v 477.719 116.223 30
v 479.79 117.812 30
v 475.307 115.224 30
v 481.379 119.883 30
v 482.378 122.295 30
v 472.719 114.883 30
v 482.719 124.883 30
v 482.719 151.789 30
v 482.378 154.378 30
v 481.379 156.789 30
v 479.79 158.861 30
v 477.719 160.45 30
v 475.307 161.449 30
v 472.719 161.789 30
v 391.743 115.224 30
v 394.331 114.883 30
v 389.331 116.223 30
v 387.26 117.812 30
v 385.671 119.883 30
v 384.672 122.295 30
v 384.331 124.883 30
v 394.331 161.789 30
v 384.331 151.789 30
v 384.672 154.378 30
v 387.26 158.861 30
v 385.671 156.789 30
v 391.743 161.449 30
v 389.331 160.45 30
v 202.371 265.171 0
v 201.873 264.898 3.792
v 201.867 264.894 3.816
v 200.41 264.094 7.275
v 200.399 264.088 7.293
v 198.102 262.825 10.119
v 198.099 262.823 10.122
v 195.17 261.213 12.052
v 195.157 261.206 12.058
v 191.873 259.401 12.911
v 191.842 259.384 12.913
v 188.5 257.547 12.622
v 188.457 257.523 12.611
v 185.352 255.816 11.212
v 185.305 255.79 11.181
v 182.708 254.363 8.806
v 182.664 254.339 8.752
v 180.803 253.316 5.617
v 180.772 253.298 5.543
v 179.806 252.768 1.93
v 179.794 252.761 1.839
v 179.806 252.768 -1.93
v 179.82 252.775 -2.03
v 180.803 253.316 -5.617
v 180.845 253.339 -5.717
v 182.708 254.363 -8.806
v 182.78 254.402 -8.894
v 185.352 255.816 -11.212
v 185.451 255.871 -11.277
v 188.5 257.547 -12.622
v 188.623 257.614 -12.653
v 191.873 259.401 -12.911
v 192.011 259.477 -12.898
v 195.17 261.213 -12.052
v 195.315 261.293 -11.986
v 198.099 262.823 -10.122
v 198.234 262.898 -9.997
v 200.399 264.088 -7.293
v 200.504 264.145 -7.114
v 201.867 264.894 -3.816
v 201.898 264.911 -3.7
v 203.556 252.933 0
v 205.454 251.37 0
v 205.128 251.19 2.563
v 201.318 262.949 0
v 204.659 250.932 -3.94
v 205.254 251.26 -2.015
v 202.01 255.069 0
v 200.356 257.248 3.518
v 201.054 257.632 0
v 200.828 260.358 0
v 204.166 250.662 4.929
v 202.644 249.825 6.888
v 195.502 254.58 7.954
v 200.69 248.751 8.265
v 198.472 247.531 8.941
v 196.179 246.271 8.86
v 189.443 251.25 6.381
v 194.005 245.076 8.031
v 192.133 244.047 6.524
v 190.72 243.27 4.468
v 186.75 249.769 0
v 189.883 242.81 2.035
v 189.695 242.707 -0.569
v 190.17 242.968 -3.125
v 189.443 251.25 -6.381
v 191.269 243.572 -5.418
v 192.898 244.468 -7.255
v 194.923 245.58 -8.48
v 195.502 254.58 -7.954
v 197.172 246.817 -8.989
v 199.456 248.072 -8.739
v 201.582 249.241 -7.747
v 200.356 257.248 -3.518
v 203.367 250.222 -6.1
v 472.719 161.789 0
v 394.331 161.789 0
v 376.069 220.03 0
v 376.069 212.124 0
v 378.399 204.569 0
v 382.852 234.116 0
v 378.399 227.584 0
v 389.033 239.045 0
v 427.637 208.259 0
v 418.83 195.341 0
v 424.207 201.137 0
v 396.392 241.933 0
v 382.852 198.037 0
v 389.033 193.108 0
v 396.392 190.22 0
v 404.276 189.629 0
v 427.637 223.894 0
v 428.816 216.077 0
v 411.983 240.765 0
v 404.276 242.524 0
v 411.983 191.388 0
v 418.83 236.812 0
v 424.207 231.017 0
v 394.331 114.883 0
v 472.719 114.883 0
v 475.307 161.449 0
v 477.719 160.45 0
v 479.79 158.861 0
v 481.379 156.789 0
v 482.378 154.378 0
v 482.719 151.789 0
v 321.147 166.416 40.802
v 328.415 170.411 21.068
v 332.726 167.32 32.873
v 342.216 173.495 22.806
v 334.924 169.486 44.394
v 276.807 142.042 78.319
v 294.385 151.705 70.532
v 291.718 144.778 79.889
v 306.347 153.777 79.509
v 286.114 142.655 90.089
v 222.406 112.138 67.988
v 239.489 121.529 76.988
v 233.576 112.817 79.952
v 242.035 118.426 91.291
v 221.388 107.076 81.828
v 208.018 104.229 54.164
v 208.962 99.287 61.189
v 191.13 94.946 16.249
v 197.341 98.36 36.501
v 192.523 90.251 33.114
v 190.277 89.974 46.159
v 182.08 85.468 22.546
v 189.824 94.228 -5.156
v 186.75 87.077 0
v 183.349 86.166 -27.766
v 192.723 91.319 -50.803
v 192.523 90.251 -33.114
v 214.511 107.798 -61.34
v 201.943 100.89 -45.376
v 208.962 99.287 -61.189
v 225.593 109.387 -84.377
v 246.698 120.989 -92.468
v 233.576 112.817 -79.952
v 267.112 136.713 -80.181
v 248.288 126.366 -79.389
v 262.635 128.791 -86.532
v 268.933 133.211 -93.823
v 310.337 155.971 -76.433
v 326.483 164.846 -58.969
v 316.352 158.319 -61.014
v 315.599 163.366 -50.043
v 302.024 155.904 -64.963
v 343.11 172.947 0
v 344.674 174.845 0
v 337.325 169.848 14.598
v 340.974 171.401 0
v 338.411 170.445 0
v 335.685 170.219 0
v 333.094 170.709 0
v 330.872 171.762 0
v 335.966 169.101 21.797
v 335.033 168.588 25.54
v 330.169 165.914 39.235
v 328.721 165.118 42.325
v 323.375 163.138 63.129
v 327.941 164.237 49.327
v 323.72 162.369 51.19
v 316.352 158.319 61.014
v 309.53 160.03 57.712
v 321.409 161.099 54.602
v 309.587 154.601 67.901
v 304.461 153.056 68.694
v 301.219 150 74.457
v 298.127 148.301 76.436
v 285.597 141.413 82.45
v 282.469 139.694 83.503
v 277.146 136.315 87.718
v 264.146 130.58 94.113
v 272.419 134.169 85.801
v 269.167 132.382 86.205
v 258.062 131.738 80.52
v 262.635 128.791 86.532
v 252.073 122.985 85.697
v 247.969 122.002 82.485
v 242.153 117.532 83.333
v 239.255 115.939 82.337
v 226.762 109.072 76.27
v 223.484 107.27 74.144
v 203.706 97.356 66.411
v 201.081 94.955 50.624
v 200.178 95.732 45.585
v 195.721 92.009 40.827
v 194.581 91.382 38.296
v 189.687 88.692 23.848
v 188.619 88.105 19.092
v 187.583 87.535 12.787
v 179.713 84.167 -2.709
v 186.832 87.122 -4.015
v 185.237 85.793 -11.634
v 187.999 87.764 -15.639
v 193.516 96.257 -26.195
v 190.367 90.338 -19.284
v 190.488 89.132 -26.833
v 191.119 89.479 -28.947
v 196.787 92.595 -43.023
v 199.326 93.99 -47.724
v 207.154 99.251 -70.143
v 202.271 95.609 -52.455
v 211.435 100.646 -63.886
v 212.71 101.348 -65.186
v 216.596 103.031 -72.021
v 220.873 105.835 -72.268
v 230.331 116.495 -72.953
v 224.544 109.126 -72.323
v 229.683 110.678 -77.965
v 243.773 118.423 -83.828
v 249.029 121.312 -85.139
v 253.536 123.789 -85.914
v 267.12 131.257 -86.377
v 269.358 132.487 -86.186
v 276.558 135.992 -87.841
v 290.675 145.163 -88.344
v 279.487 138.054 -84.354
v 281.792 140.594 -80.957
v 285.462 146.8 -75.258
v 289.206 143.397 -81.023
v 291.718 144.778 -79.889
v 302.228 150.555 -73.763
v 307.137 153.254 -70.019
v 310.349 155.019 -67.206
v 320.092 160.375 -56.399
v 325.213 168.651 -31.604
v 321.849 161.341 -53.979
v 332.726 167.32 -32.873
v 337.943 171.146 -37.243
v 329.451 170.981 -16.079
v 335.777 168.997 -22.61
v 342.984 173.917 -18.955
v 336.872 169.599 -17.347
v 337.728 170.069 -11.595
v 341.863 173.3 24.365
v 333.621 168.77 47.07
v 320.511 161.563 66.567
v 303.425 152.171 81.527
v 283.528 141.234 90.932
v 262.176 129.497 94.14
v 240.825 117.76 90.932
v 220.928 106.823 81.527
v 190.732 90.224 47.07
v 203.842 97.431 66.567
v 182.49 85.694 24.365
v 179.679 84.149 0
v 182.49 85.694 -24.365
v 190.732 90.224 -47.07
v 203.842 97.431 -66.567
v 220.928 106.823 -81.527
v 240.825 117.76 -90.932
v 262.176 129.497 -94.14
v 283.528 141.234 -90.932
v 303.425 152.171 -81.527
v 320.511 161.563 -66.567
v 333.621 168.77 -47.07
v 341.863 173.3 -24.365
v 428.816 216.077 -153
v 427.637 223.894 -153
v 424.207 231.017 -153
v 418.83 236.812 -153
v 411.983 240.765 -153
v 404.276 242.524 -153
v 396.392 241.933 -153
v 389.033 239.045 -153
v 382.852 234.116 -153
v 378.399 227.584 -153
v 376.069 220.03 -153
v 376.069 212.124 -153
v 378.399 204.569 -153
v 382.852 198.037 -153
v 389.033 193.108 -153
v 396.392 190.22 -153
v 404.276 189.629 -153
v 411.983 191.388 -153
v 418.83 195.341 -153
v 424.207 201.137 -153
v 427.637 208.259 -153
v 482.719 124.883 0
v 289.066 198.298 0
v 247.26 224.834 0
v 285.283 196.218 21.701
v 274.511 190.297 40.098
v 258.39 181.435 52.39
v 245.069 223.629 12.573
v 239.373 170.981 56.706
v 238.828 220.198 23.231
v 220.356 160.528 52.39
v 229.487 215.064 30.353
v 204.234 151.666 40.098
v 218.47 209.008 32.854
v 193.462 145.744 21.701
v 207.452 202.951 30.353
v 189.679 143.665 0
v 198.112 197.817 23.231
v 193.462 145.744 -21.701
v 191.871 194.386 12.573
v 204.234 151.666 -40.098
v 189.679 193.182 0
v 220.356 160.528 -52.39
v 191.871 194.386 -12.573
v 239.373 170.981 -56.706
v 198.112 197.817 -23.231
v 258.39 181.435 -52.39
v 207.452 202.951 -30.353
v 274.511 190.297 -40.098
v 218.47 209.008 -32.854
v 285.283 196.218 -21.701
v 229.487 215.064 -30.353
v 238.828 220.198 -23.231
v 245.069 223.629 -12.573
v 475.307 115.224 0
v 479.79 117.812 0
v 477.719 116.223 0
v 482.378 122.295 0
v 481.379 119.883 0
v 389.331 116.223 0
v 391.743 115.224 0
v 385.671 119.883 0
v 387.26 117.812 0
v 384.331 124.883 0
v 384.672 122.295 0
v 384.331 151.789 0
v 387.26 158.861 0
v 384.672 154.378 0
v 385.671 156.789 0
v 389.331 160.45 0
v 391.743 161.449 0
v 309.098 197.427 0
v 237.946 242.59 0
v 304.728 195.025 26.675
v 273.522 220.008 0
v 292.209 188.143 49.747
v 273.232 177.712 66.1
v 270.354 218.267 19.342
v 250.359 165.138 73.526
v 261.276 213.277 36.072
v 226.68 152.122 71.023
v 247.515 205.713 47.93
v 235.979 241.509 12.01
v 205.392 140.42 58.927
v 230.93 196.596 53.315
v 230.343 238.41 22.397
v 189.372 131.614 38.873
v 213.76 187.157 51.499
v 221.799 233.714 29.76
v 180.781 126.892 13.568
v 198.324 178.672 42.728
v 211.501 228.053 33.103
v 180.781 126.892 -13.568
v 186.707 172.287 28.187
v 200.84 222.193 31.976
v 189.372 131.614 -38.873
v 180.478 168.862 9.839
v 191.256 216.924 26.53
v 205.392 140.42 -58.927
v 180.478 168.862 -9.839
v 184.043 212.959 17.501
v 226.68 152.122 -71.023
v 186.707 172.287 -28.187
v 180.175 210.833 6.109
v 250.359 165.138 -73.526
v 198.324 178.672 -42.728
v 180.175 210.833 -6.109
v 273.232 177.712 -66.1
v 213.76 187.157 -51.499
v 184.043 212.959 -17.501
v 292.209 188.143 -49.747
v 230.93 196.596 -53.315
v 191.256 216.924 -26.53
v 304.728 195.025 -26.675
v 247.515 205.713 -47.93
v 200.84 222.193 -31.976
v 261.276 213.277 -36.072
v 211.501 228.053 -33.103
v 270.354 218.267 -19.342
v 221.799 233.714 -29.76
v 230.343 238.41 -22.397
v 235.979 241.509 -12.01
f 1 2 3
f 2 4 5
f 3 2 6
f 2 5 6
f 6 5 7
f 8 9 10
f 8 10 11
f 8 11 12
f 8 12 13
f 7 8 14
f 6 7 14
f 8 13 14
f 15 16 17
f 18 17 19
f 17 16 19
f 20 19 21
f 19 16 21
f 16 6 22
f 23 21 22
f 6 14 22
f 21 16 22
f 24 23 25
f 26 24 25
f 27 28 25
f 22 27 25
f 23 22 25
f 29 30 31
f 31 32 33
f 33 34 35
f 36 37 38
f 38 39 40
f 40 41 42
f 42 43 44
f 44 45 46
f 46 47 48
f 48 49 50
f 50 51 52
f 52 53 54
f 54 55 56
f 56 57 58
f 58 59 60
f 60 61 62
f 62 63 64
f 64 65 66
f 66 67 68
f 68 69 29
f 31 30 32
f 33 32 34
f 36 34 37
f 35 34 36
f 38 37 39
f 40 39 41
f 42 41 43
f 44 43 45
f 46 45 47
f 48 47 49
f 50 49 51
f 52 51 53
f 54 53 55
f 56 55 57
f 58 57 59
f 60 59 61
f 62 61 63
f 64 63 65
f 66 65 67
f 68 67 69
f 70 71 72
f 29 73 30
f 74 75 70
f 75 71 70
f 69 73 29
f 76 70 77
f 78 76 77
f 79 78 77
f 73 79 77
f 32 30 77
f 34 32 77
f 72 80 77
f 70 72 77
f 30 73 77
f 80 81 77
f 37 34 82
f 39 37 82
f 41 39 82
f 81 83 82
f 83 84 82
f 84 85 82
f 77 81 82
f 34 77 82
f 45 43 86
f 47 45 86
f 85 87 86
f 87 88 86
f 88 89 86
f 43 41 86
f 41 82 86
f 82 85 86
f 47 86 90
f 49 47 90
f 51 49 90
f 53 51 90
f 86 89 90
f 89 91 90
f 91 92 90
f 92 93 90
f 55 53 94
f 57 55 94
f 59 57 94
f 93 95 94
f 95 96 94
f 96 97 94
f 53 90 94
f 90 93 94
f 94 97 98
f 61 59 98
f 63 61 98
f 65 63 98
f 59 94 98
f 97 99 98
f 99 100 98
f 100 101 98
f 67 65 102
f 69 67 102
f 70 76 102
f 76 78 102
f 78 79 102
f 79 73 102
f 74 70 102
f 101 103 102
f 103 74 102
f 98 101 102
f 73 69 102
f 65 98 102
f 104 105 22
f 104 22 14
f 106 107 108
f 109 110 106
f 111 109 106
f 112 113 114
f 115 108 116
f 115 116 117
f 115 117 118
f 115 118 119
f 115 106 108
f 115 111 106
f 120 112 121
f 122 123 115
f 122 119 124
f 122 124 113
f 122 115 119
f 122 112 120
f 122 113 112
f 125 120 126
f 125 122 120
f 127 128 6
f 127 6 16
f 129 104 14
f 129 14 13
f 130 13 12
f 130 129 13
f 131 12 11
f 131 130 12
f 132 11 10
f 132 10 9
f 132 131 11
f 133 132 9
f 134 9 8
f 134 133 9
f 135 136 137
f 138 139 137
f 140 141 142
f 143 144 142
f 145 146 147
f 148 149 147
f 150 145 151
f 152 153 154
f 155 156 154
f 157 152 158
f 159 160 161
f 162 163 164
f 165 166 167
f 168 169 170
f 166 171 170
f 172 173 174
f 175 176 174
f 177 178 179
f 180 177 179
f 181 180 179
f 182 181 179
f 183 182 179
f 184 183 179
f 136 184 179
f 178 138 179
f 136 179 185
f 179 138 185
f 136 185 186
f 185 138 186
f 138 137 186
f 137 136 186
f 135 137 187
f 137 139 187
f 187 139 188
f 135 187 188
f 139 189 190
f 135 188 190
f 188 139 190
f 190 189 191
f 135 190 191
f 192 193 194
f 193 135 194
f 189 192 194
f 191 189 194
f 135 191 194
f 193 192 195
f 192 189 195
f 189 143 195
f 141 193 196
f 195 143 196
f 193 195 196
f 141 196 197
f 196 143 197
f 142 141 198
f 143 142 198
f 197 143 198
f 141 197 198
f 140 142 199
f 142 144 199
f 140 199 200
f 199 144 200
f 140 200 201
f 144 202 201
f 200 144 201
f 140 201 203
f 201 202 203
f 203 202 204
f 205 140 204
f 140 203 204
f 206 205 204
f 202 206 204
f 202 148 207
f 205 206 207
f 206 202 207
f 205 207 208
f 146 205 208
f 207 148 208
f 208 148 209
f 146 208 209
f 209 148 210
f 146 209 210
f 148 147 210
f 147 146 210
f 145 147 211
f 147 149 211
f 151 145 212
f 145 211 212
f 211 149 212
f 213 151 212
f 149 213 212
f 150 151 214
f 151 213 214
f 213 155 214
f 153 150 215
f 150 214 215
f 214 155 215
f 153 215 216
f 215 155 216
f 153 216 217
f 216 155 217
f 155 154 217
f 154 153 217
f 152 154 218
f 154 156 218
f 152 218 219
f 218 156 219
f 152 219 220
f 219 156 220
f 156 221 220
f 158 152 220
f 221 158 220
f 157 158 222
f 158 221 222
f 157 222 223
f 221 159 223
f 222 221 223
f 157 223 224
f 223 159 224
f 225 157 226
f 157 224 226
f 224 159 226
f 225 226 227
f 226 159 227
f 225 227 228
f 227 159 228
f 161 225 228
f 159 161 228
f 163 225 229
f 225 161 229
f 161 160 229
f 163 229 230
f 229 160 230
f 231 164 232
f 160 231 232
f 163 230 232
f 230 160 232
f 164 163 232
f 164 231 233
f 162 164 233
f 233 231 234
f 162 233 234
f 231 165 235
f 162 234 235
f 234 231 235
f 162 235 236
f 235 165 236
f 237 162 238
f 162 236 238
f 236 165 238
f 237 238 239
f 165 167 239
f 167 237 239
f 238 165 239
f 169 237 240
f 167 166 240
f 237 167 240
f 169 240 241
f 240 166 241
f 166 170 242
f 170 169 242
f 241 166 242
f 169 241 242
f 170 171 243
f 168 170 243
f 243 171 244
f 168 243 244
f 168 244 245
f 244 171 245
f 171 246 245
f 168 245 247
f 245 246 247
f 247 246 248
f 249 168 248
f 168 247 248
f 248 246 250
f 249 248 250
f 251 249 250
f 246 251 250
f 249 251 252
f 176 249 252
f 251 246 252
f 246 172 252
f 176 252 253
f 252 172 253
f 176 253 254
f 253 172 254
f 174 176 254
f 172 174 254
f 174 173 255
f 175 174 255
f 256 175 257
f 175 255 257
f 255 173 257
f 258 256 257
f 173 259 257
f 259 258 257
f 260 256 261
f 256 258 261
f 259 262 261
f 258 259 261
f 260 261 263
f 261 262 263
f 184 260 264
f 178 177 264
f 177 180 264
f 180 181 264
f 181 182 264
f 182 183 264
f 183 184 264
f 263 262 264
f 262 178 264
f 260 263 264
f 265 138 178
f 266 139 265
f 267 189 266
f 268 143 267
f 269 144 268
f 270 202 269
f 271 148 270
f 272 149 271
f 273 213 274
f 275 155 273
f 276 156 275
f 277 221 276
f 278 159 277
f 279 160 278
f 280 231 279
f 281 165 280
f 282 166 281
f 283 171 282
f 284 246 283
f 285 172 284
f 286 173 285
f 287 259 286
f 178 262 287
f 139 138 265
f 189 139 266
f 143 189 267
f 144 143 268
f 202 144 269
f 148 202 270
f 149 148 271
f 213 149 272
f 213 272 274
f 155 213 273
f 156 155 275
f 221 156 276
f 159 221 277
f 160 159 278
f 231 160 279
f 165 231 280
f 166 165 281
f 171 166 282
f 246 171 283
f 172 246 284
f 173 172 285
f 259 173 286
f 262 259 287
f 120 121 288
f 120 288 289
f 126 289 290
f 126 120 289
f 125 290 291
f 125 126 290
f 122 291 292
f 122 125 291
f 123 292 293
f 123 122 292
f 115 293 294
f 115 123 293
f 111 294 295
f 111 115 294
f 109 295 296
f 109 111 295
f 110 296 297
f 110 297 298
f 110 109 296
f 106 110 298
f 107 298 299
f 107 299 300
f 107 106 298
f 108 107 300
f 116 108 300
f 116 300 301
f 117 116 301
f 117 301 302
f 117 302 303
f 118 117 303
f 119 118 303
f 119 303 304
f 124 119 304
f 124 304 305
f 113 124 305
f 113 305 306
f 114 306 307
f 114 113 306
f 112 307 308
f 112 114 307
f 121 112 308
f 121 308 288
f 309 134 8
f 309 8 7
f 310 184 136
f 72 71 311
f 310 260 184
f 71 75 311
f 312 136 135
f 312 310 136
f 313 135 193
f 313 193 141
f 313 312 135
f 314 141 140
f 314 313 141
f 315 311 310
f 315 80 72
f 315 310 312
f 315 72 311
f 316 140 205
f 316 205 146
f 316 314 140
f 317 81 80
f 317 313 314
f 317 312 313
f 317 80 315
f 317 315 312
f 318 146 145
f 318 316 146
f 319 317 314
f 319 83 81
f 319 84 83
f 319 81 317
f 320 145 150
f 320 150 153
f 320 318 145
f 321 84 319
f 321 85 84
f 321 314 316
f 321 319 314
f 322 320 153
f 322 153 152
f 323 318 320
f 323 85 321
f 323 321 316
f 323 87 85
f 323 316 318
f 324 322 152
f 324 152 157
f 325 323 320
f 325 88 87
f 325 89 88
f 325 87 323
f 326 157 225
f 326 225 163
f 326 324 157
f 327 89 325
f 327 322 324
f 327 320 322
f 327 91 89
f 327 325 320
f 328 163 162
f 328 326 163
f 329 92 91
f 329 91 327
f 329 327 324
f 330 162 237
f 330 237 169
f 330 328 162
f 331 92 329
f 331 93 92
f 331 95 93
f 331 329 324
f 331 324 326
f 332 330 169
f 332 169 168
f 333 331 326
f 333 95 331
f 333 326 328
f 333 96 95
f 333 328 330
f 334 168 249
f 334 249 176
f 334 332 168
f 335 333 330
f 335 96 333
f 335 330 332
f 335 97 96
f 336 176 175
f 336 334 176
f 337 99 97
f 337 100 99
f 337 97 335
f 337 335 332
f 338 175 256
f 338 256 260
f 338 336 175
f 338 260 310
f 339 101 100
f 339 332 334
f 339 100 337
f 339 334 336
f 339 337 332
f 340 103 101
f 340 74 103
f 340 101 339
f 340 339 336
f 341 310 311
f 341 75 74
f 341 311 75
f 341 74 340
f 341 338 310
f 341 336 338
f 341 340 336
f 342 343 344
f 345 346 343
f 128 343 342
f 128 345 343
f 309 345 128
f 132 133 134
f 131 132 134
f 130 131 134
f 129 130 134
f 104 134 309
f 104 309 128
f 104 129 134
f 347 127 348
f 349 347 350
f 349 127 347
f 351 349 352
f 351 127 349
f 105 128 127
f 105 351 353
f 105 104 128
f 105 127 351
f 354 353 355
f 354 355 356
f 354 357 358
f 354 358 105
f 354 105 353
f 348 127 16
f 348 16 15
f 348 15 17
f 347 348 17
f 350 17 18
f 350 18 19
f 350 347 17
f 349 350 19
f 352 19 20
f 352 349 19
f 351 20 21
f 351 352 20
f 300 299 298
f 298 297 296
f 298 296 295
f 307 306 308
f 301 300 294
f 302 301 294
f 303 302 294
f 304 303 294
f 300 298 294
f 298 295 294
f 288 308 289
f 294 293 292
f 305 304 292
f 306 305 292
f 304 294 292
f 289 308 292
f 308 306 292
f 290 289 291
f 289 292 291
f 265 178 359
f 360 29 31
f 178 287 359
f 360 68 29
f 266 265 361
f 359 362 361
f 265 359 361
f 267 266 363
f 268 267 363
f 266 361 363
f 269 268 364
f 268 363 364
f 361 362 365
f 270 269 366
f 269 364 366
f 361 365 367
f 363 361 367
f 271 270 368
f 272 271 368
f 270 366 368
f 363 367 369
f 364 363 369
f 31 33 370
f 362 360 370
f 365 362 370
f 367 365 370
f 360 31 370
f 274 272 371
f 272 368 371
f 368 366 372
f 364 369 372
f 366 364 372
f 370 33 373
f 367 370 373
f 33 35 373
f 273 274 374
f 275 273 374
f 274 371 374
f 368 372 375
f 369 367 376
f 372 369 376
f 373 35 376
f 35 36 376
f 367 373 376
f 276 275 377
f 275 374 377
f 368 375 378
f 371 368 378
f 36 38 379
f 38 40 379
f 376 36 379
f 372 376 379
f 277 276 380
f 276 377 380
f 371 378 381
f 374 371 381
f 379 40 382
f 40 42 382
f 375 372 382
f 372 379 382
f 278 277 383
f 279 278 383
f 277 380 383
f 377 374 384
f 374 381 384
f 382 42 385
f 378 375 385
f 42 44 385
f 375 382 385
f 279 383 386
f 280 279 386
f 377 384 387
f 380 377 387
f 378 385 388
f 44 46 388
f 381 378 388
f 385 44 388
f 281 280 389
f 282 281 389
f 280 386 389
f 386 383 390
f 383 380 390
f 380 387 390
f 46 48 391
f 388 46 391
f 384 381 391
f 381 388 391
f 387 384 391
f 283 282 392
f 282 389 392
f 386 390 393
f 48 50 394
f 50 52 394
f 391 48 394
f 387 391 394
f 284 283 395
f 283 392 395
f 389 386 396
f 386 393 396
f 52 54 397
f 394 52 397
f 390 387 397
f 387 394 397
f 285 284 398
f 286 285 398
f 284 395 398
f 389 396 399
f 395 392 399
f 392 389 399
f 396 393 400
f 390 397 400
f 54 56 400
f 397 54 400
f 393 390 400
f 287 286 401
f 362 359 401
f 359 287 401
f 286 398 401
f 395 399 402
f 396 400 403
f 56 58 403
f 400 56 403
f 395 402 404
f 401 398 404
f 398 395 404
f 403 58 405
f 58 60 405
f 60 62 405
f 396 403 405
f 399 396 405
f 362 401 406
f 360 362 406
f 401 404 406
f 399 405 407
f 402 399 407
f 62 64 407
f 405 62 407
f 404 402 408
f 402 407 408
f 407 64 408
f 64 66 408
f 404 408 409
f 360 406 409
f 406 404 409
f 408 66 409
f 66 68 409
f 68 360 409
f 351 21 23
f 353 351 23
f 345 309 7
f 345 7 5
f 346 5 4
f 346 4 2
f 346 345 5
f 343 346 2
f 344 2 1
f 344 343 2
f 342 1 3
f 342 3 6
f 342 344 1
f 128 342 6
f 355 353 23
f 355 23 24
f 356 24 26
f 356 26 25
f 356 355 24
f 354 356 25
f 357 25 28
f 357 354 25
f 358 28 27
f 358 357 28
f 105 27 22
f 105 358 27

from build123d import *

# Parameters (mm, degrees)
SKETCH1_W           = 10
SKETCH1_H           = 168.549429456
FILLET1_R           = 10
SKETCH2_R           = 26.521587753
BOSS_EXTRUDE1_DEPTH = 153
BOSS_EXTRUDE2_DEPTH = 30


with BuildPart() as part:
    # Sketch1 → Revolve-Thin1 (revolve)
    with BuildSketch(Plane.XY, mode=Mode.PRIVATE) as revolve_thin1_sk:
        with Locations((184.679193334, 168.423310959)):
            Rectangle(SKETCH1_W, SKETCH1_H)
    revolve(revolve_thin1_sk.sketch.rotate(Axis((194.453275648, 252.698025687, 0), (0.48171451341834604, -0.8763282076722888, 0)), 180), axis=Axis((194.453275648, 252.698025687, 0), (0.48171451341834604, -0.8763282076722888, 0)))

    # Fillet1
    fillet1_edges = [part.edges().sort_by_distance(p)[0] for p in [
        (189.679193334, 252.698025687, 0),
        (189.679193334, 84.148596231, 0),
    ]]
    fillet(fillet1_edges, radius=FILLET1_R - 0.0001)  # a hair under: the kernel refuses the full size


with BuildPart() as body_2:
    # Sketch2 → Boss-Extrude1 (new body)
    with BuildSketch(Plane.XY):
        with Locations((402.293944257, 216.076736945)):
            Circle(SKETCH2_R)
    extrude(amount=-BOSS_EXTRUDE1_DEPTH)


with BuildPart() as body_3:
    # Sketch3 → Boss-Extrude2 (new body)
    with BuildSketch(Plane.XY):
        with BuildLine():
            Line((394.330774187, 161.789494026), (472.718965476, 161.789494026))
            ThreePointArc((472.718965476, 161.789494026), (479.790033288, 158.860561838), (482.718965476, 151.789494026))
            Line((482.718965476, 151.789494026), (482.718965476, 124.883495853))
            ThreePointArc((482.718965476, 124.883495853), (479.790033288, 117.812428042), (472.718965476, 114.883495853))
            Line((472.718965476, 114.883495853), (394.330774187, 114.883495853))
            ThreePointArc((394.330774187, 114.883495853), (387.259706375, 117.812428042), (384.330774187, 124.883495853))
            Line((384.330774187, 124.883495853), (384.330774187, 151.789494026))
            ThreePointArc((384.330774187, 151.789494026), (387.259706375, 158.860561838), (394.330774187, 161.789494026))
        make_face()
    extrude(amount=BOSS_EXTRUDE2_DEPTH)


solid = Compound([part.part, body_2.part, body_3.part])
